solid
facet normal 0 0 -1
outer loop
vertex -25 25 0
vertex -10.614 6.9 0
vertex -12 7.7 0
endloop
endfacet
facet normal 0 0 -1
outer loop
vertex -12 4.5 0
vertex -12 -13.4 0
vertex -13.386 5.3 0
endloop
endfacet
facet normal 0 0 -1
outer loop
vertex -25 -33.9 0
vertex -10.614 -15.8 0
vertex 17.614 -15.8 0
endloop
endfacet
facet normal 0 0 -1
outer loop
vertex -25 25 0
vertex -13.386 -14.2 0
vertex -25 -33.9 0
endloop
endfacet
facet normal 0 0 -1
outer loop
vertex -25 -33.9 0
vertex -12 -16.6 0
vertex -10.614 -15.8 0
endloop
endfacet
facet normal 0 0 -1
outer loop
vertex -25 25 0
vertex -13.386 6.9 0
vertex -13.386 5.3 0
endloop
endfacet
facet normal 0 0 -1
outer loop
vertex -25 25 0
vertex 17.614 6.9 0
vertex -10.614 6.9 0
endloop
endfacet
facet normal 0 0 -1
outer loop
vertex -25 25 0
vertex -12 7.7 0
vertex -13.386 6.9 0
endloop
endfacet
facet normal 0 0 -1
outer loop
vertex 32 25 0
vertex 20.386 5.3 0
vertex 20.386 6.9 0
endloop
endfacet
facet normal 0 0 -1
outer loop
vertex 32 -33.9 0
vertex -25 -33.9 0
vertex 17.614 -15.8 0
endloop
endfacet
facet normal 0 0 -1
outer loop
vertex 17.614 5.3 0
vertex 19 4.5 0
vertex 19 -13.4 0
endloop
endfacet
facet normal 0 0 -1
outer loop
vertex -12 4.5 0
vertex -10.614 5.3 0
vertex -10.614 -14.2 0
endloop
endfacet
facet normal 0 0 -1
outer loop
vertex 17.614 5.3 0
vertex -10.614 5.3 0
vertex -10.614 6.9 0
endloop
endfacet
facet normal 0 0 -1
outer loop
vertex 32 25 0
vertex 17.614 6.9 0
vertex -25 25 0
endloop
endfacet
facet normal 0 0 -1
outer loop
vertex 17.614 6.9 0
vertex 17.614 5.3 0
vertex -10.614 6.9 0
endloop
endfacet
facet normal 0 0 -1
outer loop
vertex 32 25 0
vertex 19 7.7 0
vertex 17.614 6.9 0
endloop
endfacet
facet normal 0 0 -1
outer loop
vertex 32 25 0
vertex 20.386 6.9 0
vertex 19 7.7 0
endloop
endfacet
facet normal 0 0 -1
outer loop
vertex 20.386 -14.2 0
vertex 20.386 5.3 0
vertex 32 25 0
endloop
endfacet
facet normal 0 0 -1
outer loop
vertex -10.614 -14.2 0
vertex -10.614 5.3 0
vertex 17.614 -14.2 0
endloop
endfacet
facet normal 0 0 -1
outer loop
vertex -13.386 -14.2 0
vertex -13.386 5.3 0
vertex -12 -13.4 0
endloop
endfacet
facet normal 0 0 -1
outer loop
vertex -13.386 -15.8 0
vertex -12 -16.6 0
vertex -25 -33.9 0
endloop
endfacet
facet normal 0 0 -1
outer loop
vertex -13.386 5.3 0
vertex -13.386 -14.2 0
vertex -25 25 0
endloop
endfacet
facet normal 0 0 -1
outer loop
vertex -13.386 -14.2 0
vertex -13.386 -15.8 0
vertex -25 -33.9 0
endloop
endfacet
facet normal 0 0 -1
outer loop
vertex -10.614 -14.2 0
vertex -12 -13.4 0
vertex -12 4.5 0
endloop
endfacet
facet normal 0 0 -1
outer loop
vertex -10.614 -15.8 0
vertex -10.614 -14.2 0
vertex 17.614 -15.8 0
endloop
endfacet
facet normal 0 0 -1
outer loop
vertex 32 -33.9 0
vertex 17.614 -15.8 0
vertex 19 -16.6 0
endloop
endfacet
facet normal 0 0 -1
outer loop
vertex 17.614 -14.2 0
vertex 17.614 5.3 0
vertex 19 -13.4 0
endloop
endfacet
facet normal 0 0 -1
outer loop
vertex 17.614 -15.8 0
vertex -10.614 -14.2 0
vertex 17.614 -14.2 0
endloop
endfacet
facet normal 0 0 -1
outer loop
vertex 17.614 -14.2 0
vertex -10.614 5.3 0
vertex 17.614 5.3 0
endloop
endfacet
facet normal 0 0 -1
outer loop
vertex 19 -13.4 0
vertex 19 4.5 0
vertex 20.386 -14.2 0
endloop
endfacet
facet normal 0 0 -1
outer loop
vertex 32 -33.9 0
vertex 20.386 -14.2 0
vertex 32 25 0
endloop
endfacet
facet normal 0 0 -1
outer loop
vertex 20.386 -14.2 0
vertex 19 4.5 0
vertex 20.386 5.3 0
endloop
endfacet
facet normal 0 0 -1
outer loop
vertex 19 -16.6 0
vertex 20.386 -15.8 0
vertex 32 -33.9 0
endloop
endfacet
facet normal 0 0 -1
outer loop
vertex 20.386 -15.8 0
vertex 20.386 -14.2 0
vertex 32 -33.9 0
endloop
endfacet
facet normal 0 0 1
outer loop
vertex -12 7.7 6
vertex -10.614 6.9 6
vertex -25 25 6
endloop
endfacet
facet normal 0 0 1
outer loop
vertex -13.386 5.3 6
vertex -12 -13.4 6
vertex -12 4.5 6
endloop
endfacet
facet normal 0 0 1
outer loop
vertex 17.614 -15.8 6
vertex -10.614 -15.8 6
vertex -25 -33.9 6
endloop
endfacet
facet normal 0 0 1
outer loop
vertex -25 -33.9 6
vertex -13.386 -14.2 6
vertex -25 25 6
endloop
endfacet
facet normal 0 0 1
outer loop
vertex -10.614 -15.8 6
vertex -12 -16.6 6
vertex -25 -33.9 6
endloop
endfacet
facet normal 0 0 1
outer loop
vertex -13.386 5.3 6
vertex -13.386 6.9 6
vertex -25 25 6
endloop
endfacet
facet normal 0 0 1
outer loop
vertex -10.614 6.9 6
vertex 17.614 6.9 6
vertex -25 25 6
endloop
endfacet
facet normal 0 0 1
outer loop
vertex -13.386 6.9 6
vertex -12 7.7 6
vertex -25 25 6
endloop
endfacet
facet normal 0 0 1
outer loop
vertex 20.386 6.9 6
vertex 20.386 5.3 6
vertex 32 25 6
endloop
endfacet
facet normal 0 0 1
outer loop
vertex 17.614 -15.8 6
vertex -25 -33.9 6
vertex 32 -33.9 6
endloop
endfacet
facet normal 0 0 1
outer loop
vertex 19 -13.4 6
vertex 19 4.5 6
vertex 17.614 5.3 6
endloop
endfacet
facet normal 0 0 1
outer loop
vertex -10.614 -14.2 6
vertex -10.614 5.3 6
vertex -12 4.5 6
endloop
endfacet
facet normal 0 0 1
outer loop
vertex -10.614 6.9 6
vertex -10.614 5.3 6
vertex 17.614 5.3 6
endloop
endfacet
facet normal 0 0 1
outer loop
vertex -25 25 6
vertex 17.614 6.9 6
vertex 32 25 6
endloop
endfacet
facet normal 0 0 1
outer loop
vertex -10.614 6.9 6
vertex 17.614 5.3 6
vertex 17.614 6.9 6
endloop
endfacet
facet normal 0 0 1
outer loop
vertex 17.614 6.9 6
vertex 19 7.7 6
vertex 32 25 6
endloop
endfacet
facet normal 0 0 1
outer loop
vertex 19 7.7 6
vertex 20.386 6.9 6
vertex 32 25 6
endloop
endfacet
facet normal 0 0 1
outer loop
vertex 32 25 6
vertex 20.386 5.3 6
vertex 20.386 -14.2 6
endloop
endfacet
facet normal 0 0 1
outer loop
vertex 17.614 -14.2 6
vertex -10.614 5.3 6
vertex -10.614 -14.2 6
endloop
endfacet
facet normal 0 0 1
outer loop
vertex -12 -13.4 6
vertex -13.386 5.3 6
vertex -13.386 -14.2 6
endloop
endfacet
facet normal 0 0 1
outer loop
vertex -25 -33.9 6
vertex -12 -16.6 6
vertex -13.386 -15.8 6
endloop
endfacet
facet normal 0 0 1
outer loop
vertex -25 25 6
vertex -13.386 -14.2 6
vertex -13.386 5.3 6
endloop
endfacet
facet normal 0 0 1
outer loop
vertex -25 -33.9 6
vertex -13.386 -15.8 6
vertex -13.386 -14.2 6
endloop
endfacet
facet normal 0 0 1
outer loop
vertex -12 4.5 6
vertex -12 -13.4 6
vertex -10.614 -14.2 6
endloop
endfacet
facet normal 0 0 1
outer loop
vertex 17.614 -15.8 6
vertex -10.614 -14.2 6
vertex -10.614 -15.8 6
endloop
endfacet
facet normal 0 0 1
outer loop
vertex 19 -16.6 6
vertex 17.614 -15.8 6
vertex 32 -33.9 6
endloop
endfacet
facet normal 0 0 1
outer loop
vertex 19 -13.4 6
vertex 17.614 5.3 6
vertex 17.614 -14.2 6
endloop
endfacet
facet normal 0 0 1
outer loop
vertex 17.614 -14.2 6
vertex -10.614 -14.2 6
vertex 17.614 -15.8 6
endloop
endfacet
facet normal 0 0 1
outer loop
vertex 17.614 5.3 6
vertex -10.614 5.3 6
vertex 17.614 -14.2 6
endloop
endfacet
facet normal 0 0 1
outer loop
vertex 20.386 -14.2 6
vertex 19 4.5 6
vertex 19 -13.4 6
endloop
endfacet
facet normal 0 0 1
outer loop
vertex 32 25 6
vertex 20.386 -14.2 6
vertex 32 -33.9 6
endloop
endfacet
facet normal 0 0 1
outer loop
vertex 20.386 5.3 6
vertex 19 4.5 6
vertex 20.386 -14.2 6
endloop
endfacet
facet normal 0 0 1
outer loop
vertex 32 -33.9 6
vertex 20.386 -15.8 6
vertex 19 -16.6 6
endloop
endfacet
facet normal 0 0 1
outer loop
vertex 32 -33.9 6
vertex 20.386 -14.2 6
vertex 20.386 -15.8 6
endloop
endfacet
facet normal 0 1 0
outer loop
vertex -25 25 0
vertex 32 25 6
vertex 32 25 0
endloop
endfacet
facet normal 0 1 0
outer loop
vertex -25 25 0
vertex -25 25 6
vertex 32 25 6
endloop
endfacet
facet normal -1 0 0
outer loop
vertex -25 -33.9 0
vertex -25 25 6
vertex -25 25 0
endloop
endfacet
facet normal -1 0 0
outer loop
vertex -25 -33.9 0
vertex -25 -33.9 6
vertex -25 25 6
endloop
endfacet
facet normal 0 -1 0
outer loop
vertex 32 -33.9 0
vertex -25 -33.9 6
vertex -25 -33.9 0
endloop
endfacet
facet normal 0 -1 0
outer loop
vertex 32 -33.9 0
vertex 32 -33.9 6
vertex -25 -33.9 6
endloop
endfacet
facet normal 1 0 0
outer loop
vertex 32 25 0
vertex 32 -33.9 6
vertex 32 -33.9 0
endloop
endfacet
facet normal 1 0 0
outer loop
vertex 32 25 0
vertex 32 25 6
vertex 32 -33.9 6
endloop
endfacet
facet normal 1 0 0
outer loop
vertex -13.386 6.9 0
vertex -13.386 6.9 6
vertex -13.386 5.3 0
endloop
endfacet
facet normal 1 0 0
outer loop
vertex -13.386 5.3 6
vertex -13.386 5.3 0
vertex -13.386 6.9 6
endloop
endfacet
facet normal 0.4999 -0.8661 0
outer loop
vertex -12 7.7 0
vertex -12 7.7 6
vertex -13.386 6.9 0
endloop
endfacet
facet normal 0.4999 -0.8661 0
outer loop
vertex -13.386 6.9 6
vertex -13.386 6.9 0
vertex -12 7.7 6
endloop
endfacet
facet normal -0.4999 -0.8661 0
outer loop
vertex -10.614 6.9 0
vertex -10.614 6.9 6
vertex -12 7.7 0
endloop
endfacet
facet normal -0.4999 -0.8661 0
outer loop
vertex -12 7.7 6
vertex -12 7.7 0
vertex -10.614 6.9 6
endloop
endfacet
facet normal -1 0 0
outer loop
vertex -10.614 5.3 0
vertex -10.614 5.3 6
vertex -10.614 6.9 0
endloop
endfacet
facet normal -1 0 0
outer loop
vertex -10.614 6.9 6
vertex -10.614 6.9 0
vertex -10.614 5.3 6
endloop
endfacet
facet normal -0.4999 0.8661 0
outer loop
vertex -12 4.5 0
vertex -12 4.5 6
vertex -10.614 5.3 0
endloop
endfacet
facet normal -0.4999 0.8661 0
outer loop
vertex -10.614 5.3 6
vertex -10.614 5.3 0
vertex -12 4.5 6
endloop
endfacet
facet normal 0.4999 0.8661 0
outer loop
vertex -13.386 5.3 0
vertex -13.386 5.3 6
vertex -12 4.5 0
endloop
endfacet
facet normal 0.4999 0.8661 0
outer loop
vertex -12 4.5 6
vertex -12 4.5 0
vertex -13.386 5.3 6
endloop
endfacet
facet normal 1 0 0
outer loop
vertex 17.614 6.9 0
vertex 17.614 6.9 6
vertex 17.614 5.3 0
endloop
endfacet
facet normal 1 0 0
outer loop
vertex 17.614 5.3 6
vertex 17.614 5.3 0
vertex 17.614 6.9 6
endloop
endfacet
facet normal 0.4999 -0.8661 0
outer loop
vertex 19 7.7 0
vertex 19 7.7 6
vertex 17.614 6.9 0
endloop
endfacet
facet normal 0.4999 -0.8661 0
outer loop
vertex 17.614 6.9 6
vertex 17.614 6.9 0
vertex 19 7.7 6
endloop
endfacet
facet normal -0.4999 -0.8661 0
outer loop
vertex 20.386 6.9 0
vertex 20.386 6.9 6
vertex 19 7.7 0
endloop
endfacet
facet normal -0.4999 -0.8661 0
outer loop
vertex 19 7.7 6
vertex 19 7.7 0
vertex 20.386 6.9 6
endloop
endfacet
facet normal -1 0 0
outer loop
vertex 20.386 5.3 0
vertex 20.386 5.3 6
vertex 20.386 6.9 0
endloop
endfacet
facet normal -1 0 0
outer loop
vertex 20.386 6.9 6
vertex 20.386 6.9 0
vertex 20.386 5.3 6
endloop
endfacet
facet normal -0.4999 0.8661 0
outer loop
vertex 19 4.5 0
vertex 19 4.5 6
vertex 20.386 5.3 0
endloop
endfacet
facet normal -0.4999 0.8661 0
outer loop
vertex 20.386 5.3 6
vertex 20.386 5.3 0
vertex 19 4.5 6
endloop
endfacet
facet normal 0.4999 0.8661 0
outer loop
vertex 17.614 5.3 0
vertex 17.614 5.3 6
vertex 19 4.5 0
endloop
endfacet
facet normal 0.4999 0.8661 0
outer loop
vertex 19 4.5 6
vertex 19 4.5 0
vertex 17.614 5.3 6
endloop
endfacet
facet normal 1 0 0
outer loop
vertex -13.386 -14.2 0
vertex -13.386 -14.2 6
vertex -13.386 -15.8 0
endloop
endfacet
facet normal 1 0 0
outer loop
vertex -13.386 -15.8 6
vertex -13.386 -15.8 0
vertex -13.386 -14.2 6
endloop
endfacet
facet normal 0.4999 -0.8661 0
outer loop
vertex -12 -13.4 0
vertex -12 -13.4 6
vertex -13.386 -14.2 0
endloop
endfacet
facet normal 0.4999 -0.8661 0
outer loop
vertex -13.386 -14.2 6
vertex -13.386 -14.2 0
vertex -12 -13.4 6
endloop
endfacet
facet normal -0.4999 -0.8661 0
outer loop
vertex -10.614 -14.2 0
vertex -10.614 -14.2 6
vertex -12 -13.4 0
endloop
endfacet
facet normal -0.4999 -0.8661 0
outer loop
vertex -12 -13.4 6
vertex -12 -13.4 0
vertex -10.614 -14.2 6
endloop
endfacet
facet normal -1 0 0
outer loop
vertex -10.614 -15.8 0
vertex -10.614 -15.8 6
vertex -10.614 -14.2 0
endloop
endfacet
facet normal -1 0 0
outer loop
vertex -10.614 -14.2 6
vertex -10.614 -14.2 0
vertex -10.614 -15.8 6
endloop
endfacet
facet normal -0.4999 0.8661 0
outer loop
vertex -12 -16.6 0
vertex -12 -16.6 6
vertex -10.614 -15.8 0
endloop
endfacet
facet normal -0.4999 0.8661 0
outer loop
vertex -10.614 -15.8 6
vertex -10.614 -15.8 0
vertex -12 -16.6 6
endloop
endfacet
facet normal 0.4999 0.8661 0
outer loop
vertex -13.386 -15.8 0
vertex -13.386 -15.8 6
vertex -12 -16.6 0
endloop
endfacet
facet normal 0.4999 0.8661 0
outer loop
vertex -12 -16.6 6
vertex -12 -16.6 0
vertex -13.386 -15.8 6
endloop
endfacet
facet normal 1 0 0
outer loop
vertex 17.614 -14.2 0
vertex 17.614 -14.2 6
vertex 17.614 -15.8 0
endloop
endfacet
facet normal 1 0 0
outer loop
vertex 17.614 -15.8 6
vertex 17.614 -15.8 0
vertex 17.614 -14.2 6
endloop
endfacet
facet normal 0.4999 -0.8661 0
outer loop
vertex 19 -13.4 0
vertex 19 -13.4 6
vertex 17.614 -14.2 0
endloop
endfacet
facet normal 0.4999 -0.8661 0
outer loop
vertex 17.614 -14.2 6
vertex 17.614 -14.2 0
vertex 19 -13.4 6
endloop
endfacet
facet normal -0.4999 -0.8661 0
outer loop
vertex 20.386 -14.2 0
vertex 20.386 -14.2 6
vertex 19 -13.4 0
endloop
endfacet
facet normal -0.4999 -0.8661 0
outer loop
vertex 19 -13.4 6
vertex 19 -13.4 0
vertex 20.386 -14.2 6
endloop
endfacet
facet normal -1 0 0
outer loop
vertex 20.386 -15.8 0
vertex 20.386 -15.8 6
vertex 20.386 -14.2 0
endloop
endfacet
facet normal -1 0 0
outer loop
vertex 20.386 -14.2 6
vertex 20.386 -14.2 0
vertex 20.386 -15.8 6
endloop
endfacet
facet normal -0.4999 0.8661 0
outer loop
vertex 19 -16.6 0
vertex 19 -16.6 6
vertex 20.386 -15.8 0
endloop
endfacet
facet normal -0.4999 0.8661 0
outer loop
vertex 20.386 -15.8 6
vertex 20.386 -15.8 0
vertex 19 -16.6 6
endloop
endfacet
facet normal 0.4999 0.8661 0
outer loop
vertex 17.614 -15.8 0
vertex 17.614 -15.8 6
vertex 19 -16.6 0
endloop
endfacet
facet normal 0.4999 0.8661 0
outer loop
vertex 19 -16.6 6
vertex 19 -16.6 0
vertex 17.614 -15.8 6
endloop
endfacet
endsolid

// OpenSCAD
hole_d = 3.2;
dxdy_wrong = [24, 30];
dxdy = [17.0 + 25.2, 33.2 + 28.8] / 2; //[21.1 ,31]
outer_dims = [33, 40];
radius = 25;


module mirror2(xyz) {
  children();
  mirror(xyz) children();
}

linear_extrude(6)
  translate([dxdy.y / 2 - dxdy_wrong.x / 2, dxdy.x / 2 - dxdy_wrong.y / 2]) {
    difference() {
      square([28.5, 29.45] * 2, center = true);
      rotate([0, 0, 90])mirror2([1, 0, 0]) mirror2([0, 1, 0]) translate(dxdy / 2) circle(d = hole_d);
    }
  }

//translate([0, 0, -1]) linear_extrude(1) difference() {
//  square(25 * 2, center = true);
//  circle(10);
//  mirror2([1, 0, 0]) mirror2([0, 1, 0]) translate([24, 30] / 2) circle(d = 4);
//}
